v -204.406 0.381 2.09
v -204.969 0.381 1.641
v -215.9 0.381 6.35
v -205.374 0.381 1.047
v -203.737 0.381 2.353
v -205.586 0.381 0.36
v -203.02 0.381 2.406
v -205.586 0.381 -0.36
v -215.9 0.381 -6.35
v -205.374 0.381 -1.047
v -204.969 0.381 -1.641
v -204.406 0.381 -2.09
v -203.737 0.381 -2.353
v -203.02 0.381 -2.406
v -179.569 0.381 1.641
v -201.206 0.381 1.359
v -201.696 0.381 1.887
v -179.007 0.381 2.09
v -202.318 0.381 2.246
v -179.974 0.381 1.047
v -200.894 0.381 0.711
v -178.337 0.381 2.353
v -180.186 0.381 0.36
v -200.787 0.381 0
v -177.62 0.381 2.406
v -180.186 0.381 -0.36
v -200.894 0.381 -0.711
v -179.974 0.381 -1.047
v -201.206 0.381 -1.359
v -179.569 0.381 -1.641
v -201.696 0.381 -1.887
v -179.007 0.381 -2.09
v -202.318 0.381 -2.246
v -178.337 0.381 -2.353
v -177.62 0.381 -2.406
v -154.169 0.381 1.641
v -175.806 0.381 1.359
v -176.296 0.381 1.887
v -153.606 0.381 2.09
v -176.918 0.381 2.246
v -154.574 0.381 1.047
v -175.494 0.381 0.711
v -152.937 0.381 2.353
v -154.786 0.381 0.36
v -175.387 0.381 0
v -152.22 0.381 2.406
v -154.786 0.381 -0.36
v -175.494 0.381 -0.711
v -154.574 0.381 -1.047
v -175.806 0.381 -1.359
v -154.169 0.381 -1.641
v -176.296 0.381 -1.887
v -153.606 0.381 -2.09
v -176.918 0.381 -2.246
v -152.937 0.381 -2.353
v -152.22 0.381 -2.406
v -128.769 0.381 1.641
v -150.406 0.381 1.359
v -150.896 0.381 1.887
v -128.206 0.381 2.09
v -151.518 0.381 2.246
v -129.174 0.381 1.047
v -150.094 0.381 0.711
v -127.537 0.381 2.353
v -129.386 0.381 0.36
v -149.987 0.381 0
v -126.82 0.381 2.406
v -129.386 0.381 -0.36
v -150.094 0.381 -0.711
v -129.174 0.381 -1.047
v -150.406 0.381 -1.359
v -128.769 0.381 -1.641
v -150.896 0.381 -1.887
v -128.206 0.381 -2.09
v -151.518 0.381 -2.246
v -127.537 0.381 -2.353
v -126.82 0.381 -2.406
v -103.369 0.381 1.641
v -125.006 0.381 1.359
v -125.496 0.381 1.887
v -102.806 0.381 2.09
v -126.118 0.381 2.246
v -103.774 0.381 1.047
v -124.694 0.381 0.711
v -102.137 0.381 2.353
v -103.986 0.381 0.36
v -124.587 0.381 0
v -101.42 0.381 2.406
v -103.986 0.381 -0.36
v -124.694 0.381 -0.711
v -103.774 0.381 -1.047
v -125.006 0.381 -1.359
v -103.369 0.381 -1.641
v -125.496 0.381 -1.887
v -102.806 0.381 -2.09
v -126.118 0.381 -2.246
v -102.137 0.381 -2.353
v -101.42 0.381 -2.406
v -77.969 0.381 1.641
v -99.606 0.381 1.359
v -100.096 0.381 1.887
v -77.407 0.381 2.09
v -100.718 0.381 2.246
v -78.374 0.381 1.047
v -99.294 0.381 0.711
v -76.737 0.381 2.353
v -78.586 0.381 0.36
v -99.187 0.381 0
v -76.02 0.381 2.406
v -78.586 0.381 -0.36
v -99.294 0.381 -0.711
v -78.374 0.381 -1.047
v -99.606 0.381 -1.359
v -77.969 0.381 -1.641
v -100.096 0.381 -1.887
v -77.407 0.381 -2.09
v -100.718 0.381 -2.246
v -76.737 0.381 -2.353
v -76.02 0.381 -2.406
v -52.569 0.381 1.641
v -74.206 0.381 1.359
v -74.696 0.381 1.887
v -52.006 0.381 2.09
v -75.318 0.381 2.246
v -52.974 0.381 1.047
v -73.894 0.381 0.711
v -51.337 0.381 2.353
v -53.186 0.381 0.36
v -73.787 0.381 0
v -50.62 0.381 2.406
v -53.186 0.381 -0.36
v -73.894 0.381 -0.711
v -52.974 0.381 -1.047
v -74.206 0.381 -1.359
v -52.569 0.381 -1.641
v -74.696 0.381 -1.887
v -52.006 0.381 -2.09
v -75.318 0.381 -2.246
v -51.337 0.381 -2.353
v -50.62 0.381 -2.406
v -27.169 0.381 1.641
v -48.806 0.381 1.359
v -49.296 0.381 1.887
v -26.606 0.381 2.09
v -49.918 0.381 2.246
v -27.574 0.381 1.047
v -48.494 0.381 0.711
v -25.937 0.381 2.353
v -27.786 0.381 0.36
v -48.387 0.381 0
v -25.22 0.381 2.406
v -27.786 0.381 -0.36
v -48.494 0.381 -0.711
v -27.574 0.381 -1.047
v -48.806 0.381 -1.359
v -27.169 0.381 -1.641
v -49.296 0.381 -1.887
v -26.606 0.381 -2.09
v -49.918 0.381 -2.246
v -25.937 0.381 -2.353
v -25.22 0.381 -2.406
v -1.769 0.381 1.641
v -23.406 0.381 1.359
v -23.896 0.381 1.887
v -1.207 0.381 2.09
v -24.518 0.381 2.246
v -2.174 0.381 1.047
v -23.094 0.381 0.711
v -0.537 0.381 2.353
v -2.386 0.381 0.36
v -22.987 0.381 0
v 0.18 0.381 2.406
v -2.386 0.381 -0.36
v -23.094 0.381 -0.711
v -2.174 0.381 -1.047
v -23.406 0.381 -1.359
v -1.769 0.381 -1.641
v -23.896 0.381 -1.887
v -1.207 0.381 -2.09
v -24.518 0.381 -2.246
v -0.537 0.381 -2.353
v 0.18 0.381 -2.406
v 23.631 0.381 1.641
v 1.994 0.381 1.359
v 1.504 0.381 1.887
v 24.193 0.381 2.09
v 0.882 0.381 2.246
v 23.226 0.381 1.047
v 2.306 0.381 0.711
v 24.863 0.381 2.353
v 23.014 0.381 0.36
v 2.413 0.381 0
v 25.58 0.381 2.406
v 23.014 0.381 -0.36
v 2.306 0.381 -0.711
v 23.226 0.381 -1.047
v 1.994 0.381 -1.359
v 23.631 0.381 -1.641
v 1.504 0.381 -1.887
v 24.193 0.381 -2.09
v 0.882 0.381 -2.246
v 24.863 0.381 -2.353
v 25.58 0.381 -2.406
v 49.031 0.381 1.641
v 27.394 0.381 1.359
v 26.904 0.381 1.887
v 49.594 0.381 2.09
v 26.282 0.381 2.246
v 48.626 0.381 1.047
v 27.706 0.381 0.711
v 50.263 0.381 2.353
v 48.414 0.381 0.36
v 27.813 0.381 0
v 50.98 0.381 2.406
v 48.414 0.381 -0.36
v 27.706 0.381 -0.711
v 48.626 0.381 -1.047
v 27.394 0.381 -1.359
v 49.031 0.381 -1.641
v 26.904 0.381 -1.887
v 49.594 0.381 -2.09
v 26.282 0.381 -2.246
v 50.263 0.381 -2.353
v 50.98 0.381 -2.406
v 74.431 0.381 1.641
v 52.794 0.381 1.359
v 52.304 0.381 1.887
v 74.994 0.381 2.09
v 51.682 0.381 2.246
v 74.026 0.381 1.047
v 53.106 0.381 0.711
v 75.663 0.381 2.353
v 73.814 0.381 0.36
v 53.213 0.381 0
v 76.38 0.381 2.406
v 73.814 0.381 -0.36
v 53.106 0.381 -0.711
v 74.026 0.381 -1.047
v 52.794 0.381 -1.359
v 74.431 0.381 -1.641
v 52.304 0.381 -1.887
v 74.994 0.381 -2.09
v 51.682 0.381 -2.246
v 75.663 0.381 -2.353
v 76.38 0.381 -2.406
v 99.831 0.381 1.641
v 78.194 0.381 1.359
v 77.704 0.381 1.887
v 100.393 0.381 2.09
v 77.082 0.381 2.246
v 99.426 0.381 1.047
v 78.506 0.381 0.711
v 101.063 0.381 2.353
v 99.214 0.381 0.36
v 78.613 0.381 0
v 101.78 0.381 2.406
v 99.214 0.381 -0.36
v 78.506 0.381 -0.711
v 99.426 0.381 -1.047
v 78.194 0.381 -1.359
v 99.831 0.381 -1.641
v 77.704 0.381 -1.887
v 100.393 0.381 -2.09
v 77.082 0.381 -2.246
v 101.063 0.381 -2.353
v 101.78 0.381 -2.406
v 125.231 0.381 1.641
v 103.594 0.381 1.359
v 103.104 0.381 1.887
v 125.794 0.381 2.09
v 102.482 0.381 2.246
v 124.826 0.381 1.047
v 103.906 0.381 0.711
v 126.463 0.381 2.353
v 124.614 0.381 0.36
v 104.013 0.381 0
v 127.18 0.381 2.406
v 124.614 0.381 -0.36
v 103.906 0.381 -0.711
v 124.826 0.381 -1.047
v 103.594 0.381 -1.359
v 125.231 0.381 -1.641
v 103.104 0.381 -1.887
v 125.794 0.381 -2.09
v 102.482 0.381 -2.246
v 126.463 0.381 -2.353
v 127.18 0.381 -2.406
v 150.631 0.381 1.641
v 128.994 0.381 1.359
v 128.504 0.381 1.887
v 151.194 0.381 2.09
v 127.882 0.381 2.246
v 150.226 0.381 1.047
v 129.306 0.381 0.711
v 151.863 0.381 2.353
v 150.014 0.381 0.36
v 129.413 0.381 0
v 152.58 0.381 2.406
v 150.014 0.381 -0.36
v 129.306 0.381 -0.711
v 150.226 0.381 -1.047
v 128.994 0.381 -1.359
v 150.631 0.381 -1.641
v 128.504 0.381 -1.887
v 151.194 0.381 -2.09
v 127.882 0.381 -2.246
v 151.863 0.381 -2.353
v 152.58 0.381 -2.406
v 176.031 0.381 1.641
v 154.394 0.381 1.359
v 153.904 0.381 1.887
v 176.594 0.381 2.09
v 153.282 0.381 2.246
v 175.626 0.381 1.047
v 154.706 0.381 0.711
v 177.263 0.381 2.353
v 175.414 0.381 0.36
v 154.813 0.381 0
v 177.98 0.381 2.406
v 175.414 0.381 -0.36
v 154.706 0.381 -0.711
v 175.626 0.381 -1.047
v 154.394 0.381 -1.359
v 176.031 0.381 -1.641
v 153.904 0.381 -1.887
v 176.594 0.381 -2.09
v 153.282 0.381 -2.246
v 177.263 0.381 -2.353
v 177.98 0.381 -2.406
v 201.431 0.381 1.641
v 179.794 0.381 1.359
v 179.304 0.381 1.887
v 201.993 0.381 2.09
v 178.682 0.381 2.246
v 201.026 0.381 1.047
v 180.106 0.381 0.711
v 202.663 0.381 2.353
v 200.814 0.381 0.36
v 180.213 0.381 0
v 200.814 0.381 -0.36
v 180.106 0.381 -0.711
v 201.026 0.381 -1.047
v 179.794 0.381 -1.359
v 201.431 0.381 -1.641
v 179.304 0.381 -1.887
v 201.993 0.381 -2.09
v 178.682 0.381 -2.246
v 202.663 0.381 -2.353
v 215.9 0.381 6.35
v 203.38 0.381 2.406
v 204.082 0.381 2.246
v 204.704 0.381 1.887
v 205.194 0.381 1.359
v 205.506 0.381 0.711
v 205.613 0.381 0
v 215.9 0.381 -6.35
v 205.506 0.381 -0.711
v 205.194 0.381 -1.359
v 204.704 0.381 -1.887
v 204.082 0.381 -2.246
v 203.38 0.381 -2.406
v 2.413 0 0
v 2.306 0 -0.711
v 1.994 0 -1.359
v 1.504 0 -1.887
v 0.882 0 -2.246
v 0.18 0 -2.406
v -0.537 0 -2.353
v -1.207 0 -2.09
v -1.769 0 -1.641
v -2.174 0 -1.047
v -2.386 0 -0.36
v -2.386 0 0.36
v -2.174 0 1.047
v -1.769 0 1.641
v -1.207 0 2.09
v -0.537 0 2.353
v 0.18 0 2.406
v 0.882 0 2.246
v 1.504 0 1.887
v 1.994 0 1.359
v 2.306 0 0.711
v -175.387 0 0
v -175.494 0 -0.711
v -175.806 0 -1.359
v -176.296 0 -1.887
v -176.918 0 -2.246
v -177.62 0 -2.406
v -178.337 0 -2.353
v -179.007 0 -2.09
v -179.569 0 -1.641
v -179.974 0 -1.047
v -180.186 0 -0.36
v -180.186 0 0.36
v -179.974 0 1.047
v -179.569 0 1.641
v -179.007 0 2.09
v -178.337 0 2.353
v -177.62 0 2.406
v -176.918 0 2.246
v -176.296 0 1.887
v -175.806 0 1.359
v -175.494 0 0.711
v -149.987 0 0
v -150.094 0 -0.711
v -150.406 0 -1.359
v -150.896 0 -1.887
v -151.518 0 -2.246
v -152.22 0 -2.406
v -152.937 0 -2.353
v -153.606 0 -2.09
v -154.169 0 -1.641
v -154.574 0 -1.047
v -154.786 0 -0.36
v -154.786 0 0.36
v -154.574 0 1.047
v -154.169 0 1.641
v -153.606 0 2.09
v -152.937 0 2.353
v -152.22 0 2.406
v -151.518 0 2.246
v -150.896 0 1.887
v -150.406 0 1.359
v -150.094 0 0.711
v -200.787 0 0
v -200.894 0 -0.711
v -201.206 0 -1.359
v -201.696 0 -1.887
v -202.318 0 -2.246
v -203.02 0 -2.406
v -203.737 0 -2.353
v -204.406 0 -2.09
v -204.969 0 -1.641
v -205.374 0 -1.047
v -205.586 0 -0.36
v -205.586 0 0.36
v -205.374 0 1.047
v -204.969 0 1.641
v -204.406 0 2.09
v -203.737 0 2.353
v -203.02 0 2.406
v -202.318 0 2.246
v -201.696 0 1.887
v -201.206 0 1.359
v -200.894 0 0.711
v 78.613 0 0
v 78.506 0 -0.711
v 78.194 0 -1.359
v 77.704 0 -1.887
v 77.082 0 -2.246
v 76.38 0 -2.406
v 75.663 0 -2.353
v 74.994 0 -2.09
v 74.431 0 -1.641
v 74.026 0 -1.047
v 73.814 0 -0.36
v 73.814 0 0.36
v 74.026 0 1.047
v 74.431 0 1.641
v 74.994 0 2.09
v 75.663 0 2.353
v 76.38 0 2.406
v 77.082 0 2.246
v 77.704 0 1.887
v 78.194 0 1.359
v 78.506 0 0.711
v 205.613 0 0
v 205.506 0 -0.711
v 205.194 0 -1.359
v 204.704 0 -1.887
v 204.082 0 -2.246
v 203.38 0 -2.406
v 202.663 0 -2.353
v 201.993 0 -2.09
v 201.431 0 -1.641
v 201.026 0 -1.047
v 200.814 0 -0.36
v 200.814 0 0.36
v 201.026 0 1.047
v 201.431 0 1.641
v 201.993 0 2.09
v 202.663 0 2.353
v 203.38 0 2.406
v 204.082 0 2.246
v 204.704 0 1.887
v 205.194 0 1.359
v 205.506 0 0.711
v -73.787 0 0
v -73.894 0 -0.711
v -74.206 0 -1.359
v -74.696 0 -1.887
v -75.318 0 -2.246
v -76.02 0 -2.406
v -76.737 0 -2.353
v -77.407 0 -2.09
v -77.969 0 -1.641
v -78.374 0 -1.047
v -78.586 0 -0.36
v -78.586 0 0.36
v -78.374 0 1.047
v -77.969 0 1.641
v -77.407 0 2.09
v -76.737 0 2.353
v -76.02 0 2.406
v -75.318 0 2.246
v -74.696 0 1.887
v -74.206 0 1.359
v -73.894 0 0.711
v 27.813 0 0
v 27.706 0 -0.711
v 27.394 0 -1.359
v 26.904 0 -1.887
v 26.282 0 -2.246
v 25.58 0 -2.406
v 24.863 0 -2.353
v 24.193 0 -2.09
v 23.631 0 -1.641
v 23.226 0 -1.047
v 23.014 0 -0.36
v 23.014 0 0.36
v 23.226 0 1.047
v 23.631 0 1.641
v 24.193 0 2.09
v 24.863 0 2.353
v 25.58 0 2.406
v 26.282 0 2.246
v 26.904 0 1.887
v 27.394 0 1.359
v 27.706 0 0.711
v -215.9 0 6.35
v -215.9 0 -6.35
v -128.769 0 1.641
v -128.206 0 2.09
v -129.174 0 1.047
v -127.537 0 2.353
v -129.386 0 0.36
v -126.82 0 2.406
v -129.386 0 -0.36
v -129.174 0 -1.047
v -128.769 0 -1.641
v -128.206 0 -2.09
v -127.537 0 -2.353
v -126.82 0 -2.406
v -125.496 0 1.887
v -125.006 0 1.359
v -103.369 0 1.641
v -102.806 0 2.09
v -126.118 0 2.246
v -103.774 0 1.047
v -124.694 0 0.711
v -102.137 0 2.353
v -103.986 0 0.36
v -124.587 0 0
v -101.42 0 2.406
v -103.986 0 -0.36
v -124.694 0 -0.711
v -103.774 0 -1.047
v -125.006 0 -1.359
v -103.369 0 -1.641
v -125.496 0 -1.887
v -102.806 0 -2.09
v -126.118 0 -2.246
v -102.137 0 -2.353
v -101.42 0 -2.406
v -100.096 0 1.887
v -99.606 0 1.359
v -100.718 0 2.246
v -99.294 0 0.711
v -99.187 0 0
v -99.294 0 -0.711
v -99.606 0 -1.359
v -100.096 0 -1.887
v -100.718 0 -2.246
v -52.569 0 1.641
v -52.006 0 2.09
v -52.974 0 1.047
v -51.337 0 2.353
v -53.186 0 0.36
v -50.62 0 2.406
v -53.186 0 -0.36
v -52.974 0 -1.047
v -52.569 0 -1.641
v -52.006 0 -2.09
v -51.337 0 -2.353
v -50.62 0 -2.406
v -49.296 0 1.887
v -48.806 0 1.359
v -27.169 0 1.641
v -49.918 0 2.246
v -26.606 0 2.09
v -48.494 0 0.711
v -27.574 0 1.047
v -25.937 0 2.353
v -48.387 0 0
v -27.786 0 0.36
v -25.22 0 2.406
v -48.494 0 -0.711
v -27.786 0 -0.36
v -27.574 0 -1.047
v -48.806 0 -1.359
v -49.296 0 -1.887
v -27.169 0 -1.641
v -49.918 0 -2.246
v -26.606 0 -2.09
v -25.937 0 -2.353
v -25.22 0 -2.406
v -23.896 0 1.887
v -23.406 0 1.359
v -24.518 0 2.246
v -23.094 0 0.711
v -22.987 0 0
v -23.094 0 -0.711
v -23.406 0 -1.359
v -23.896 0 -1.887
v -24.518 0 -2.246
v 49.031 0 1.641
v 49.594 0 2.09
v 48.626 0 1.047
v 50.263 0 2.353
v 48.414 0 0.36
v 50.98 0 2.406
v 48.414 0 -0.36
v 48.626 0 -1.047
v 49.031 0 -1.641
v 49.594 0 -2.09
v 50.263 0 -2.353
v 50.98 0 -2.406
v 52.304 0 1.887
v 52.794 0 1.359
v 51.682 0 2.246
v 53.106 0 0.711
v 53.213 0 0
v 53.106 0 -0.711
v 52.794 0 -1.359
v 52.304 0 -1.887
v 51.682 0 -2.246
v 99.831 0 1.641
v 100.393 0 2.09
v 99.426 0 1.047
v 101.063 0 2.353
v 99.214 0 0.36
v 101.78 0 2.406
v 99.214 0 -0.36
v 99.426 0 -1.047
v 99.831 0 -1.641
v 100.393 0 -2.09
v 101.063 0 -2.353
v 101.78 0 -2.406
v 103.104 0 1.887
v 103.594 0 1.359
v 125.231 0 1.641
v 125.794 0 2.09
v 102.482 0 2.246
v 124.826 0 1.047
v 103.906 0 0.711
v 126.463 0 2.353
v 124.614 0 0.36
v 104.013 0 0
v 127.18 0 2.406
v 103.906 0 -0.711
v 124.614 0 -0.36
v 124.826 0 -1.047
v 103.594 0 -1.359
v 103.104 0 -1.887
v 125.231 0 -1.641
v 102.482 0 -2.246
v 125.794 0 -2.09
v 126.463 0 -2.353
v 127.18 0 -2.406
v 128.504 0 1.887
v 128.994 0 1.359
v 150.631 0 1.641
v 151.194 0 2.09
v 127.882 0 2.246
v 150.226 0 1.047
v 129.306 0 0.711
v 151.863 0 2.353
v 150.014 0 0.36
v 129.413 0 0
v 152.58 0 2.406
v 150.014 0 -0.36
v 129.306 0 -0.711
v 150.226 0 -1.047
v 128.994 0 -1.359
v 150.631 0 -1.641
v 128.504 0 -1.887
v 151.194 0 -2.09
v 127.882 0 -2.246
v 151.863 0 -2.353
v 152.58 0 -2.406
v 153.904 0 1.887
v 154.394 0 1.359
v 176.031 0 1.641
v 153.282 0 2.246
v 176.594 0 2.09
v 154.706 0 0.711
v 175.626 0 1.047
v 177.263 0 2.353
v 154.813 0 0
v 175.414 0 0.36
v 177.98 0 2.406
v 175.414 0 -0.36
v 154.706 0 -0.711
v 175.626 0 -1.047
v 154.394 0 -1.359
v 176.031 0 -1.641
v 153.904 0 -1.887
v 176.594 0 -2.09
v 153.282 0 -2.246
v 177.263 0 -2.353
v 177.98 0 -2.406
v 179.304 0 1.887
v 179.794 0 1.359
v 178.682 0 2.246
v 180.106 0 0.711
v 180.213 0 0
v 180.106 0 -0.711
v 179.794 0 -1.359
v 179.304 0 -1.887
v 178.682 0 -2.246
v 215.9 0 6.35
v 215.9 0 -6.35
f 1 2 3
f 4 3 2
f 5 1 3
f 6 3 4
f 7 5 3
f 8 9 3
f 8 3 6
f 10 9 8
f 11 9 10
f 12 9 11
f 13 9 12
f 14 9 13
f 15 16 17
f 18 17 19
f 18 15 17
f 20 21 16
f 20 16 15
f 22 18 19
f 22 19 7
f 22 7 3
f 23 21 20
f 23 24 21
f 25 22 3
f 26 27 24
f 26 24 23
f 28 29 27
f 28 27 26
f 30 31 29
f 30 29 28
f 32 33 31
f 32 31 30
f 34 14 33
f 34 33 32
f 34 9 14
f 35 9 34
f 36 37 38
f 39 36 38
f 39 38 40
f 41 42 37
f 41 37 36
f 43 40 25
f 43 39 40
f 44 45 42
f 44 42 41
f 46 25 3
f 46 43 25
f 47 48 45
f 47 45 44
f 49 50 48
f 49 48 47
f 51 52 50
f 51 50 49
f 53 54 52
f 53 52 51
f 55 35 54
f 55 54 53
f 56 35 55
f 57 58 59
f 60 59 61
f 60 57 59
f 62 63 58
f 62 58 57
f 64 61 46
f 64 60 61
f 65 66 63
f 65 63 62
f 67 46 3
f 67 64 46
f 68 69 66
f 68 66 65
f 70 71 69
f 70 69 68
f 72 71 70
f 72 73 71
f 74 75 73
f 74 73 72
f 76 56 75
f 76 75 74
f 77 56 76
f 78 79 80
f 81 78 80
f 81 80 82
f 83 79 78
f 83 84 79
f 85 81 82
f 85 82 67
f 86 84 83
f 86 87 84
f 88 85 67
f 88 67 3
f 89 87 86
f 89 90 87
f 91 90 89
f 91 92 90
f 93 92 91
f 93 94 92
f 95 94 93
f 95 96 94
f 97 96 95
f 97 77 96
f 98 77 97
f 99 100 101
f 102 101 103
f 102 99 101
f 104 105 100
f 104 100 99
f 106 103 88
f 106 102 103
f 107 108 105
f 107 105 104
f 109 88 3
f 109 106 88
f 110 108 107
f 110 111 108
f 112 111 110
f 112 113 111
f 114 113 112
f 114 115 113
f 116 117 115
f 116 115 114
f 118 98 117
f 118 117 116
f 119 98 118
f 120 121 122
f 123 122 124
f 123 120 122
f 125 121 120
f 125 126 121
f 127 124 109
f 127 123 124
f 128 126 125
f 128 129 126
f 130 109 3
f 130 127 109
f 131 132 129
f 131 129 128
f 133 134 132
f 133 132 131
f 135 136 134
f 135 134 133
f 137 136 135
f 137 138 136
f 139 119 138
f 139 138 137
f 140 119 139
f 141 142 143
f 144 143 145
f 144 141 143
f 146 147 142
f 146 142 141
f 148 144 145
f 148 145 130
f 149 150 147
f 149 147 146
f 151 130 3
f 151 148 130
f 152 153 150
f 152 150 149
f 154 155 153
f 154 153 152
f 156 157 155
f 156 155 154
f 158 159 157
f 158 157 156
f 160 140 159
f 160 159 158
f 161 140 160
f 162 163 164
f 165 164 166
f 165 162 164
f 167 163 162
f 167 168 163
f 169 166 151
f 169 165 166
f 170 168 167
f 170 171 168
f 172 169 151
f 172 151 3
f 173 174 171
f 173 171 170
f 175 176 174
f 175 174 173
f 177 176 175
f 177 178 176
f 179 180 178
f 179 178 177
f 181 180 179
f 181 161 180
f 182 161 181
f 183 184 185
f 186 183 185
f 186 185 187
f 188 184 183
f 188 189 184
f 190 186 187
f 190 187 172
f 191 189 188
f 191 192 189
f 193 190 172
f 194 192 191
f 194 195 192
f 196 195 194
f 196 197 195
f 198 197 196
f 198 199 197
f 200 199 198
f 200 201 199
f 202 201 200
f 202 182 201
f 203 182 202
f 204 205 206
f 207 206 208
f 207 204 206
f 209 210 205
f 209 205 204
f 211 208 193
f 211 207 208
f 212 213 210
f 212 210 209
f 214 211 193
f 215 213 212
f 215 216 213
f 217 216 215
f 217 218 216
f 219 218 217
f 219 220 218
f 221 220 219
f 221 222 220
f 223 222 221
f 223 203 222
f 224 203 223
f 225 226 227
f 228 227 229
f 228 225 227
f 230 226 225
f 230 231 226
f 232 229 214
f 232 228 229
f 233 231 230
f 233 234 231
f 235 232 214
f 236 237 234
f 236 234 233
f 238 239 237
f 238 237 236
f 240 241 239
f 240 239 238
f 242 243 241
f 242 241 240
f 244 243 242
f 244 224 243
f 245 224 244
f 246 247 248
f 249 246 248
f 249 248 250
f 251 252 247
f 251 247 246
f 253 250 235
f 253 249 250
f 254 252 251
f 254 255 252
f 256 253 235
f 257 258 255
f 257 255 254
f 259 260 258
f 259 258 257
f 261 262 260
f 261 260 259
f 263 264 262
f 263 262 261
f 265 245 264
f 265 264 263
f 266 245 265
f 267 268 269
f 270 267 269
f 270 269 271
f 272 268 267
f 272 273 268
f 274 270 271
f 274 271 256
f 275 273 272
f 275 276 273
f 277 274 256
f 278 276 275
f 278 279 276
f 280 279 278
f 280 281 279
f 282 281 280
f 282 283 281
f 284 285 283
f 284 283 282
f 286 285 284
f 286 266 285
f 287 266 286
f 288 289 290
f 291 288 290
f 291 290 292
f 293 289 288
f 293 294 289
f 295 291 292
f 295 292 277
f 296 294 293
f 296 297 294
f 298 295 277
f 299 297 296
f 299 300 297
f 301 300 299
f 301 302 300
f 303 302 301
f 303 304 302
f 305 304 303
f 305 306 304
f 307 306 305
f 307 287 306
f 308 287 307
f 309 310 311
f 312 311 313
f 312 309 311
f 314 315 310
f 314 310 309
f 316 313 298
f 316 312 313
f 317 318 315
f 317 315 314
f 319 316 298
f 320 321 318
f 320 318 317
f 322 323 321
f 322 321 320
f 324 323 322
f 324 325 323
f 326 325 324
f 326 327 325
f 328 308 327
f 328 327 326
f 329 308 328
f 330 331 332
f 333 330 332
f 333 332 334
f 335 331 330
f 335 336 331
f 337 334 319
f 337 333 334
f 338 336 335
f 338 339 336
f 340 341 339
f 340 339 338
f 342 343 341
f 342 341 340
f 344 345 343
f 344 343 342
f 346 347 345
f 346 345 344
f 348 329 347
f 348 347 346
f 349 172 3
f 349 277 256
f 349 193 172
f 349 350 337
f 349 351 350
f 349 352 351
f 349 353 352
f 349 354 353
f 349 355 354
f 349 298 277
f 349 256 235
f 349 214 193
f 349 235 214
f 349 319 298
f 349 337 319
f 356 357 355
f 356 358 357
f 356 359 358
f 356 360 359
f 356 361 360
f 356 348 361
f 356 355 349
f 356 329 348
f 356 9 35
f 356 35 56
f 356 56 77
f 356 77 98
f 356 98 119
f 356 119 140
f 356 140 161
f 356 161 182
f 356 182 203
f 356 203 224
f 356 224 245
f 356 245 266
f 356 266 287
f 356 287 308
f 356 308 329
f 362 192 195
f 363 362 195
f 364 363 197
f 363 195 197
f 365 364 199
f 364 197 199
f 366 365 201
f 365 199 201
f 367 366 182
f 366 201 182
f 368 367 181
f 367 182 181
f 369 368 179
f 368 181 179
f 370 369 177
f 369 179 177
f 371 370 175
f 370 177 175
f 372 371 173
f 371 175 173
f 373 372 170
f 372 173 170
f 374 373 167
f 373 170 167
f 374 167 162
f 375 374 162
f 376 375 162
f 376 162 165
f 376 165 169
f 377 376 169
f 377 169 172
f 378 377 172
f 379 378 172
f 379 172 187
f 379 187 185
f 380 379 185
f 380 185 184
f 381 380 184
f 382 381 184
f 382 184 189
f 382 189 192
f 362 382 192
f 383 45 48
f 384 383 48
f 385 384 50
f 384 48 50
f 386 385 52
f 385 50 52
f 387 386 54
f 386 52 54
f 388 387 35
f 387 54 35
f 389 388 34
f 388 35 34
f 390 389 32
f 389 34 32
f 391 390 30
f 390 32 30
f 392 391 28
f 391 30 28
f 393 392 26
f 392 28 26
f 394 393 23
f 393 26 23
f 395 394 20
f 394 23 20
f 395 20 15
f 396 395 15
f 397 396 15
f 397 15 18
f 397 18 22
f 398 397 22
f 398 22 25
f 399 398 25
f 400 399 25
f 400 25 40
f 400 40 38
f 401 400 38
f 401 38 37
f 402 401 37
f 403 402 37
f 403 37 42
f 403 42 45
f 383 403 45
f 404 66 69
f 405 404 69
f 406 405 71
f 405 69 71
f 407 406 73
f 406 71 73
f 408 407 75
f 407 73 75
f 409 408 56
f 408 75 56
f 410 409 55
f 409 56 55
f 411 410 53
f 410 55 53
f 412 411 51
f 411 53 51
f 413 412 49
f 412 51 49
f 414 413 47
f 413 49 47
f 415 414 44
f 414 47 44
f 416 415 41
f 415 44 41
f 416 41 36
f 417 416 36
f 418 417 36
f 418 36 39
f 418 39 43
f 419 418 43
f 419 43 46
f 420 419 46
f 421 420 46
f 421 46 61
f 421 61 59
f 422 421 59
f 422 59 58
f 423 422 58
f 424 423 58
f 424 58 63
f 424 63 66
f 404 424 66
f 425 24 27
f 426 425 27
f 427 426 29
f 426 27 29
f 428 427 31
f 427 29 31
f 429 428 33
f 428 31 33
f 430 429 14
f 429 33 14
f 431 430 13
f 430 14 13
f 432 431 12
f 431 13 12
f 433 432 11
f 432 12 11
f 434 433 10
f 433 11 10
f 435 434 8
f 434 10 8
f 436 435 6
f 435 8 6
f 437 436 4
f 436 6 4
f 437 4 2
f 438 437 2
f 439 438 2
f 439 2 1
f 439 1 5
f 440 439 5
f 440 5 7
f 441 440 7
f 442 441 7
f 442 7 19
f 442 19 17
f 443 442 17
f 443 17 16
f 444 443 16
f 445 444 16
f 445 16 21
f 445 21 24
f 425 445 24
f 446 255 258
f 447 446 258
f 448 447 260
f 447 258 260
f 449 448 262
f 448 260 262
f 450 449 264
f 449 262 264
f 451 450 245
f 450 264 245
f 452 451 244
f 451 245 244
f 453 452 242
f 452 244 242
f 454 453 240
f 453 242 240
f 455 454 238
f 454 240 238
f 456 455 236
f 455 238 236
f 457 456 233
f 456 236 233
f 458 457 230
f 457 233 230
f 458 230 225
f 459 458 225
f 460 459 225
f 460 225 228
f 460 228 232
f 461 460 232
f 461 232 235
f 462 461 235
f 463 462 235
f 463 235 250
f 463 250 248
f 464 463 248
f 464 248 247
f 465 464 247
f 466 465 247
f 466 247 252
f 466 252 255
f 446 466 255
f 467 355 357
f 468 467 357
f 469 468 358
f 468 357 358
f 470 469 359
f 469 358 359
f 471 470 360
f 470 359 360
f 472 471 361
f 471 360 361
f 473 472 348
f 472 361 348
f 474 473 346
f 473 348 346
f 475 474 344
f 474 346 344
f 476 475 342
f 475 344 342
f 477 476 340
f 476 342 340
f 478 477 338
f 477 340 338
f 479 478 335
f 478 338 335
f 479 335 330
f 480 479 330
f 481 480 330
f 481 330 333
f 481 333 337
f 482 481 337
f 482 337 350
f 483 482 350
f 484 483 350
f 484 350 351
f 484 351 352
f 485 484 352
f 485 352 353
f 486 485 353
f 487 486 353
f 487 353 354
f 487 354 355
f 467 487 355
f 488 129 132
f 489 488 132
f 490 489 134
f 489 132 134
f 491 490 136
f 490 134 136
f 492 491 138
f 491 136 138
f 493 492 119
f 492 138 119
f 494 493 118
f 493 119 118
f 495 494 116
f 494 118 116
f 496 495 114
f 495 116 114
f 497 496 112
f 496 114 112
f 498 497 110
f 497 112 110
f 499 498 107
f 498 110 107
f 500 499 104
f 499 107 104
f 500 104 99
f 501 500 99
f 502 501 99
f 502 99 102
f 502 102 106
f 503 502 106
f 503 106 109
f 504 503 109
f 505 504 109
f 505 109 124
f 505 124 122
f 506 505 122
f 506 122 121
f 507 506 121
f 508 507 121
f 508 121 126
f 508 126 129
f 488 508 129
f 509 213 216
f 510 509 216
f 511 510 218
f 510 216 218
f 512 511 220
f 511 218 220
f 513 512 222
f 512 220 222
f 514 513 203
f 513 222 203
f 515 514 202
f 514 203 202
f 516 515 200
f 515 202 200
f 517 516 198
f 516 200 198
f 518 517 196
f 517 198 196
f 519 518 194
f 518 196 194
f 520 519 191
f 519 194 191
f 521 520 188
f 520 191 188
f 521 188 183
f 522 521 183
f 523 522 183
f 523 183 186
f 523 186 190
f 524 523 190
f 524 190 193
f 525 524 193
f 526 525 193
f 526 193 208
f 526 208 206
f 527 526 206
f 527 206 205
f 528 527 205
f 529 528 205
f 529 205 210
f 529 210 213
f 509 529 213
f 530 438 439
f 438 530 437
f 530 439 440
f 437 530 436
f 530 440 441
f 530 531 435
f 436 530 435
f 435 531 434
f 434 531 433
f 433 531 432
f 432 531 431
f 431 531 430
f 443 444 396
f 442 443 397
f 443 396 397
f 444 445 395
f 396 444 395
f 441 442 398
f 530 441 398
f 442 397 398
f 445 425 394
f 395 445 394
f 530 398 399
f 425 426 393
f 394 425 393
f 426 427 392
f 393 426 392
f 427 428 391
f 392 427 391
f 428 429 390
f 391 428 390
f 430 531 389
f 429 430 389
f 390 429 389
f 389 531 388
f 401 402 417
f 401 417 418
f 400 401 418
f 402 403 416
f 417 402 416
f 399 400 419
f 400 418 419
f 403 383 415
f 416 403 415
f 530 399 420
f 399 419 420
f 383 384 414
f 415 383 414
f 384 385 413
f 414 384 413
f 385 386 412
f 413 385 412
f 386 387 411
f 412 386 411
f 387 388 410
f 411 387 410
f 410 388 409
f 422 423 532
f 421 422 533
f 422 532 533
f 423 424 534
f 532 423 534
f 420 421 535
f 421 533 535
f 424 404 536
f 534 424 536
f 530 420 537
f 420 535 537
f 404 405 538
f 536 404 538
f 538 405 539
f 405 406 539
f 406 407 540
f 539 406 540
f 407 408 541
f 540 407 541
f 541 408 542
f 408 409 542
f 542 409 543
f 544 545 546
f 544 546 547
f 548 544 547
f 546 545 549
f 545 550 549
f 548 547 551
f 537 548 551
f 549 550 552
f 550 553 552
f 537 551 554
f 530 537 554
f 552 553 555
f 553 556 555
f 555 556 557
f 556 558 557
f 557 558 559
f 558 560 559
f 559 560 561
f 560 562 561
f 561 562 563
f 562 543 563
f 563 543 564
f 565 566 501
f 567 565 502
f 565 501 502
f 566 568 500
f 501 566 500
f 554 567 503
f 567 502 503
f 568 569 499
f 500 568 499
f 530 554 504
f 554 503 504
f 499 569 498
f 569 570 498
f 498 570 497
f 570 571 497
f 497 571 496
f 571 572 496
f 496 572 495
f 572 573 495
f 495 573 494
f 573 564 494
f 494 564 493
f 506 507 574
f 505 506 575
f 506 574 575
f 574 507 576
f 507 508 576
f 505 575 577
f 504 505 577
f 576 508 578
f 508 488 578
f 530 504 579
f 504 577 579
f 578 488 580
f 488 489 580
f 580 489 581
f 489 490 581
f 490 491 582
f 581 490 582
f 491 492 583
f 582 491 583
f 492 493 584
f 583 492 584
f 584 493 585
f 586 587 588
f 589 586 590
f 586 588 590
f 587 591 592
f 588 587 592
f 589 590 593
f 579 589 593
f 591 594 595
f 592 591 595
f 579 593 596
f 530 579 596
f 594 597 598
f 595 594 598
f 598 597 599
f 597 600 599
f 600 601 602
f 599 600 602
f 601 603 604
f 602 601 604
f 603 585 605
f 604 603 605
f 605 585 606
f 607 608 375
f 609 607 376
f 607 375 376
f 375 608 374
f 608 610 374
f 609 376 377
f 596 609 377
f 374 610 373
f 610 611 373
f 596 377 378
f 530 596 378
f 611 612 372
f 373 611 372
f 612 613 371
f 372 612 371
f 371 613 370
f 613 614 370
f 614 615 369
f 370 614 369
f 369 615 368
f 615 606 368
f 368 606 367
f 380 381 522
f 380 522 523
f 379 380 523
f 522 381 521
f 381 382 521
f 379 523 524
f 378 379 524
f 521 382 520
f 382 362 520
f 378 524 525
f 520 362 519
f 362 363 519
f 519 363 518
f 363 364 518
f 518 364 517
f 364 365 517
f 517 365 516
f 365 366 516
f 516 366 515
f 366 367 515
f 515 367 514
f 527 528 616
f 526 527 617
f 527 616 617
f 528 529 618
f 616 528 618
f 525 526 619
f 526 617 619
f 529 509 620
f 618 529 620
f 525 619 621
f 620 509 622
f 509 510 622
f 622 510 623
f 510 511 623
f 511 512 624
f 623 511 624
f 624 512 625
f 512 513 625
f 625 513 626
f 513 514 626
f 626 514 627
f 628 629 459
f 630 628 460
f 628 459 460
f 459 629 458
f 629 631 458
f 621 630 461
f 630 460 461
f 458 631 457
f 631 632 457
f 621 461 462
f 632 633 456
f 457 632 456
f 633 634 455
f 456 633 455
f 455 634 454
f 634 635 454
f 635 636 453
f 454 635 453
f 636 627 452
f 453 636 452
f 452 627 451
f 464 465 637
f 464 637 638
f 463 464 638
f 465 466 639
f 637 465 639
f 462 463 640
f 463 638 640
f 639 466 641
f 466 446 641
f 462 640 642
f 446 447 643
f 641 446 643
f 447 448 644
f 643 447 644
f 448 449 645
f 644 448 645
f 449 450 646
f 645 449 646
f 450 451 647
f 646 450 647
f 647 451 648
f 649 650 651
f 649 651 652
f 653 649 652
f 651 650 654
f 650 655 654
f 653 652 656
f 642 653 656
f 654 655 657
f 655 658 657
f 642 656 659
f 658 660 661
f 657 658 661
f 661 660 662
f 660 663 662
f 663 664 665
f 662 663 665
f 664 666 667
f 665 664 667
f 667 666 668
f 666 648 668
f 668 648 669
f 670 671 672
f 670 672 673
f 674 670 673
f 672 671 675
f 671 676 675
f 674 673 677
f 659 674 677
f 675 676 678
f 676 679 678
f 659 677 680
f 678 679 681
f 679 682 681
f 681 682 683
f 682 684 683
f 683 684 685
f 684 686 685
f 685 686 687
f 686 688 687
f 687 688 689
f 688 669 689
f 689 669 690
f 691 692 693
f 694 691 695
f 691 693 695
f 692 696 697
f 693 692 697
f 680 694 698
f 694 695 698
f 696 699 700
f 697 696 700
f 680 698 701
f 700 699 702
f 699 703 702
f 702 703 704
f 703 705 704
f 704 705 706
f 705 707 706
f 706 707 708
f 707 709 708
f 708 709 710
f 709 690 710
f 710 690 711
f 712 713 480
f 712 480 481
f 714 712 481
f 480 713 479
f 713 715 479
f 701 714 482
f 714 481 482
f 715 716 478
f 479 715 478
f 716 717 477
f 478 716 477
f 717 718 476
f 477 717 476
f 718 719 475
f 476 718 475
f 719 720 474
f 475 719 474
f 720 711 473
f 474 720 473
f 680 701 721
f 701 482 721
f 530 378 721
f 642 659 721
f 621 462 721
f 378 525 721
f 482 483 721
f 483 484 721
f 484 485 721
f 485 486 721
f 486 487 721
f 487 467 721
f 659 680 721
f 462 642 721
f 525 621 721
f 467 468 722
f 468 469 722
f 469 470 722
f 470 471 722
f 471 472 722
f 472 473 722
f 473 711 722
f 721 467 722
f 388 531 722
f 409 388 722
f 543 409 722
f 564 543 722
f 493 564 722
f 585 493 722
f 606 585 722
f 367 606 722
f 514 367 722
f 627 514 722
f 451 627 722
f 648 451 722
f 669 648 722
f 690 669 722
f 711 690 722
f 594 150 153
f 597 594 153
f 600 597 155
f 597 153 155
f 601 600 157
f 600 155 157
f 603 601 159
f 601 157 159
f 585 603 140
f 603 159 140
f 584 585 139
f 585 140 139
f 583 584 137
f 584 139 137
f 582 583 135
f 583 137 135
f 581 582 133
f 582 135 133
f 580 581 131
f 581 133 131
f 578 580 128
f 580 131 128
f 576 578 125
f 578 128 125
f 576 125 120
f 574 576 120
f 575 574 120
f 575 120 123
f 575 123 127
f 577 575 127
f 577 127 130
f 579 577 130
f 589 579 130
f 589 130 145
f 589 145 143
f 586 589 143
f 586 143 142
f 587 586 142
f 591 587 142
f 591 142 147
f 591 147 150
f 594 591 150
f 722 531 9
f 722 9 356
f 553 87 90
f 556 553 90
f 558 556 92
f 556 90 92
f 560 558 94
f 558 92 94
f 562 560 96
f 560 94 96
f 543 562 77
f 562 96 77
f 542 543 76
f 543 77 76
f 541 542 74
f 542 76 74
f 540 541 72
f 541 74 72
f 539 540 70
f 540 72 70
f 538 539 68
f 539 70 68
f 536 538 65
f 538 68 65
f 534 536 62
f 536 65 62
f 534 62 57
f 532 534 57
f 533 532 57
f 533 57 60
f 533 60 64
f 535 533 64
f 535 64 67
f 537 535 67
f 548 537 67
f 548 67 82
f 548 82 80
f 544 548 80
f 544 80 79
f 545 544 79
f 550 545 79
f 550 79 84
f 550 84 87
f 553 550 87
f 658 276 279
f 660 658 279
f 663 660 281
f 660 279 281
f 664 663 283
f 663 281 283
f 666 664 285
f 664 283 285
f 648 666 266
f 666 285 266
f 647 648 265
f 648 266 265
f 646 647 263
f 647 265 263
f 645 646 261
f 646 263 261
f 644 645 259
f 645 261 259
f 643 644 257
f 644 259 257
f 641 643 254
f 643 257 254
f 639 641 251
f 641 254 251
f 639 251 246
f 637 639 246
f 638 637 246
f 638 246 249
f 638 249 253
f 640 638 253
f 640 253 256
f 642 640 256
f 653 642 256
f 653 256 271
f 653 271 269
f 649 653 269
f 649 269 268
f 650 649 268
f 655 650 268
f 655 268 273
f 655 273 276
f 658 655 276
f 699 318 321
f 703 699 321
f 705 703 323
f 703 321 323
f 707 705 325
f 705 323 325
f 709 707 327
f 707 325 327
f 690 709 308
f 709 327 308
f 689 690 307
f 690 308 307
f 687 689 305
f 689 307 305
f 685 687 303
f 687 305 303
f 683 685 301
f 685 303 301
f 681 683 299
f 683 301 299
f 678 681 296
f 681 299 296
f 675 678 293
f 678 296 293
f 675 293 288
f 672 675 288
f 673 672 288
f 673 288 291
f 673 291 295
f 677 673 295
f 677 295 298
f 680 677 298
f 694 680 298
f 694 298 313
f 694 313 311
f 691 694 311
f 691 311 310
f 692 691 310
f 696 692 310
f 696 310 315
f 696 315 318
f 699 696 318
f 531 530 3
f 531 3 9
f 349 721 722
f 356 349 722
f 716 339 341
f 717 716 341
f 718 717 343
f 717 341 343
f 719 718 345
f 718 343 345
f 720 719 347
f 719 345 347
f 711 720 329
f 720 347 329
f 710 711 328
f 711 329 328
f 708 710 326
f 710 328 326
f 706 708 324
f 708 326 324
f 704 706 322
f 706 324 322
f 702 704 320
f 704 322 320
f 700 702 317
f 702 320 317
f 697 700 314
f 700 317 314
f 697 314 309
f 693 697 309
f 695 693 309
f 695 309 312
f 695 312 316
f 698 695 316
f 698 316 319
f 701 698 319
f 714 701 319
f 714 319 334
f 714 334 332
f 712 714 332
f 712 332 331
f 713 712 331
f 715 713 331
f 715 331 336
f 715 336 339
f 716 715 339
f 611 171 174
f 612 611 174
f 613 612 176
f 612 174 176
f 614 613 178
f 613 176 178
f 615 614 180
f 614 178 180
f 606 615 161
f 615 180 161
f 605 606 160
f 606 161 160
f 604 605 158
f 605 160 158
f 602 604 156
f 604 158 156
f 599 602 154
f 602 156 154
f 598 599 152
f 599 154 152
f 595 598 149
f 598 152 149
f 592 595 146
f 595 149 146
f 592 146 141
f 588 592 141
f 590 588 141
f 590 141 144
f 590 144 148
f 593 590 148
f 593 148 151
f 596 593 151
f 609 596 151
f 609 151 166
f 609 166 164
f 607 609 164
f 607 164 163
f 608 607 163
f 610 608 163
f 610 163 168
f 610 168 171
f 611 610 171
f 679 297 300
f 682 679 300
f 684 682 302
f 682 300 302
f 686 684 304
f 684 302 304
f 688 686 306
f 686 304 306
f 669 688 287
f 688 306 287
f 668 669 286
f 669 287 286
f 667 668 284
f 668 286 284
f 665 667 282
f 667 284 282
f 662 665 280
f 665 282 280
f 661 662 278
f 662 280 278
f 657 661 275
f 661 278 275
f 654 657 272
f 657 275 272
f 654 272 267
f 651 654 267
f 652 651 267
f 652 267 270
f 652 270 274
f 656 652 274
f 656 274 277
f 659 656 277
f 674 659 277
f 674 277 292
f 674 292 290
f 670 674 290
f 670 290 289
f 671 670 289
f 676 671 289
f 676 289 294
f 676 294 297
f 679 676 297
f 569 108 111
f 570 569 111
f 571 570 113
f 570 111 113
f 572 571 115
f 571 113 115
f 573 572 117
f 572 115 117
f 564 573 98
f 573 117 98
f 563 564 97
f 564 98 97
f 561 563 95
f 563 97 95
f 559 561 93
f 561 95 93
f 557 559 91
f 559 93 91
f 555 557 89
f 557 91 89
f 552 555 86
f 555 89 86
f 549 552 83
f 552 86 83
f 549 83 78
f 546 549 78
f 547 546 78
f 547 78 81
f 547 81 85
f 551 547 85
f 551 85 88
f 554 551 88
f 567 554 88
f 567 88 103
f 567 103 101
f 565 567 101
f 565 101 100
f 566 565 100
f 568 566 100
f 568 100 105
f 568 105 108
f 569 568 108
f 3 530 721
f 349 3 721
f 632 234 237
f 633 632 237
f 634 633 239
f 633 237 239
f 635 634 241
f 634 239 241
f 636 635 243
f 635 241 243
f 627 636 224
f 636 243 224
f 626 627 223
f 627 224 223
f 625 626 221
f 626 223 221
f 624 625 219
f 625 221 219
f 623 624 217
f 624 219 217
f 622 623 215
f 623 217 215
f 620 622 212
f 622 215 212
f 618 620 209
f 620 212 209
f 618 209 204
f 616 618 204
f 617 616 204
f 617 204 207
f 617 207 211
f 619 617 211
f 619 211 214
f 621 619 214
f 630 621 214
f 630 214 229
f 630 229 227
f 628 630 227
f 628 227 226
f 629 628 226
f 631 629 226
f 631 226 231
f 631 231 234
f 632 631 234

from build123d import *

# Parameters (mm, degrees)
SKETCH1_W           = 431.8
SKETCH1_H           = 12.7
BOSS_EXTRUDE1_DEPTH = 0.381
SKETCH2_R           = 2.413
CUT_EXTRUDE1_DEPTH  = 1.381


with BuildPart() as part:
    # Sketch1 → Boss-Extrude1 (new body)
    with BuildSketch(Plane(origin=(0, 0, 0), x_dir=(1, 0, 0), z_dir=(0, 1, 0))):
        Rectangle(SKETCH1_W, SKETCH1_H)
    extrude(amount=BOSS_EXTRUDE1_DEPTH)

    # Sketch2 → Cut-Extrude1 (cut, through all)
    with BuildSketch(Plane(origin=(0, 0.381, 0), x_dir=(1, 0, 0), z_dir=(0, 1, 0))):
        Circle(SKETCH2_R)
        with Locations((-25.4, 0)):
            Circle(SKETCH2_R)
        with Locations((25.4, 0)):
            Circle(SKETCH2_R)
        with Locations((-50.8, 0)):
            Circle(SKETCH2_R)
        with Locations((-76.2, 0)):
            Circle(SKETCH2_R)
        with Locations((-101.6, 0)):
            Circle(SKETCH2_R)
        with Locations((-127, 0)):
            Circle(SKETCH2_R)
        with Locations((-152.4, 0)):
            Circle(SKETCH2_R)
        with Locations((-177.8, 0)):
            Circle(SKETCH2_R)
        with Locations((-203.2, 0)):
            Circle(SKETCH2_R)
        with Locations((50.8, 0)):
            Circle(SKETCH2_R)
        with Locations((76.2, 0)):
            Circle(SKETCH2_R)
        with Locations((101.6, 0)):
            Circle(SKETCH2_R)
        with Locations((127, 0)):
            Circle(SKETCH2_R)
        with Locations((152.4, 0)):
            Circle(SKETCH2_R)
        with Locations((177.8, 0)):
            Circle(SKETCH2_R)
        with Locations((203.2, 0)):
            Circle(SKETCH2_R)
    extrude(amount=-CUT_EXTRUDE1_DEPTH, mode=Mode.SUBTRACT)


solid = part.part
